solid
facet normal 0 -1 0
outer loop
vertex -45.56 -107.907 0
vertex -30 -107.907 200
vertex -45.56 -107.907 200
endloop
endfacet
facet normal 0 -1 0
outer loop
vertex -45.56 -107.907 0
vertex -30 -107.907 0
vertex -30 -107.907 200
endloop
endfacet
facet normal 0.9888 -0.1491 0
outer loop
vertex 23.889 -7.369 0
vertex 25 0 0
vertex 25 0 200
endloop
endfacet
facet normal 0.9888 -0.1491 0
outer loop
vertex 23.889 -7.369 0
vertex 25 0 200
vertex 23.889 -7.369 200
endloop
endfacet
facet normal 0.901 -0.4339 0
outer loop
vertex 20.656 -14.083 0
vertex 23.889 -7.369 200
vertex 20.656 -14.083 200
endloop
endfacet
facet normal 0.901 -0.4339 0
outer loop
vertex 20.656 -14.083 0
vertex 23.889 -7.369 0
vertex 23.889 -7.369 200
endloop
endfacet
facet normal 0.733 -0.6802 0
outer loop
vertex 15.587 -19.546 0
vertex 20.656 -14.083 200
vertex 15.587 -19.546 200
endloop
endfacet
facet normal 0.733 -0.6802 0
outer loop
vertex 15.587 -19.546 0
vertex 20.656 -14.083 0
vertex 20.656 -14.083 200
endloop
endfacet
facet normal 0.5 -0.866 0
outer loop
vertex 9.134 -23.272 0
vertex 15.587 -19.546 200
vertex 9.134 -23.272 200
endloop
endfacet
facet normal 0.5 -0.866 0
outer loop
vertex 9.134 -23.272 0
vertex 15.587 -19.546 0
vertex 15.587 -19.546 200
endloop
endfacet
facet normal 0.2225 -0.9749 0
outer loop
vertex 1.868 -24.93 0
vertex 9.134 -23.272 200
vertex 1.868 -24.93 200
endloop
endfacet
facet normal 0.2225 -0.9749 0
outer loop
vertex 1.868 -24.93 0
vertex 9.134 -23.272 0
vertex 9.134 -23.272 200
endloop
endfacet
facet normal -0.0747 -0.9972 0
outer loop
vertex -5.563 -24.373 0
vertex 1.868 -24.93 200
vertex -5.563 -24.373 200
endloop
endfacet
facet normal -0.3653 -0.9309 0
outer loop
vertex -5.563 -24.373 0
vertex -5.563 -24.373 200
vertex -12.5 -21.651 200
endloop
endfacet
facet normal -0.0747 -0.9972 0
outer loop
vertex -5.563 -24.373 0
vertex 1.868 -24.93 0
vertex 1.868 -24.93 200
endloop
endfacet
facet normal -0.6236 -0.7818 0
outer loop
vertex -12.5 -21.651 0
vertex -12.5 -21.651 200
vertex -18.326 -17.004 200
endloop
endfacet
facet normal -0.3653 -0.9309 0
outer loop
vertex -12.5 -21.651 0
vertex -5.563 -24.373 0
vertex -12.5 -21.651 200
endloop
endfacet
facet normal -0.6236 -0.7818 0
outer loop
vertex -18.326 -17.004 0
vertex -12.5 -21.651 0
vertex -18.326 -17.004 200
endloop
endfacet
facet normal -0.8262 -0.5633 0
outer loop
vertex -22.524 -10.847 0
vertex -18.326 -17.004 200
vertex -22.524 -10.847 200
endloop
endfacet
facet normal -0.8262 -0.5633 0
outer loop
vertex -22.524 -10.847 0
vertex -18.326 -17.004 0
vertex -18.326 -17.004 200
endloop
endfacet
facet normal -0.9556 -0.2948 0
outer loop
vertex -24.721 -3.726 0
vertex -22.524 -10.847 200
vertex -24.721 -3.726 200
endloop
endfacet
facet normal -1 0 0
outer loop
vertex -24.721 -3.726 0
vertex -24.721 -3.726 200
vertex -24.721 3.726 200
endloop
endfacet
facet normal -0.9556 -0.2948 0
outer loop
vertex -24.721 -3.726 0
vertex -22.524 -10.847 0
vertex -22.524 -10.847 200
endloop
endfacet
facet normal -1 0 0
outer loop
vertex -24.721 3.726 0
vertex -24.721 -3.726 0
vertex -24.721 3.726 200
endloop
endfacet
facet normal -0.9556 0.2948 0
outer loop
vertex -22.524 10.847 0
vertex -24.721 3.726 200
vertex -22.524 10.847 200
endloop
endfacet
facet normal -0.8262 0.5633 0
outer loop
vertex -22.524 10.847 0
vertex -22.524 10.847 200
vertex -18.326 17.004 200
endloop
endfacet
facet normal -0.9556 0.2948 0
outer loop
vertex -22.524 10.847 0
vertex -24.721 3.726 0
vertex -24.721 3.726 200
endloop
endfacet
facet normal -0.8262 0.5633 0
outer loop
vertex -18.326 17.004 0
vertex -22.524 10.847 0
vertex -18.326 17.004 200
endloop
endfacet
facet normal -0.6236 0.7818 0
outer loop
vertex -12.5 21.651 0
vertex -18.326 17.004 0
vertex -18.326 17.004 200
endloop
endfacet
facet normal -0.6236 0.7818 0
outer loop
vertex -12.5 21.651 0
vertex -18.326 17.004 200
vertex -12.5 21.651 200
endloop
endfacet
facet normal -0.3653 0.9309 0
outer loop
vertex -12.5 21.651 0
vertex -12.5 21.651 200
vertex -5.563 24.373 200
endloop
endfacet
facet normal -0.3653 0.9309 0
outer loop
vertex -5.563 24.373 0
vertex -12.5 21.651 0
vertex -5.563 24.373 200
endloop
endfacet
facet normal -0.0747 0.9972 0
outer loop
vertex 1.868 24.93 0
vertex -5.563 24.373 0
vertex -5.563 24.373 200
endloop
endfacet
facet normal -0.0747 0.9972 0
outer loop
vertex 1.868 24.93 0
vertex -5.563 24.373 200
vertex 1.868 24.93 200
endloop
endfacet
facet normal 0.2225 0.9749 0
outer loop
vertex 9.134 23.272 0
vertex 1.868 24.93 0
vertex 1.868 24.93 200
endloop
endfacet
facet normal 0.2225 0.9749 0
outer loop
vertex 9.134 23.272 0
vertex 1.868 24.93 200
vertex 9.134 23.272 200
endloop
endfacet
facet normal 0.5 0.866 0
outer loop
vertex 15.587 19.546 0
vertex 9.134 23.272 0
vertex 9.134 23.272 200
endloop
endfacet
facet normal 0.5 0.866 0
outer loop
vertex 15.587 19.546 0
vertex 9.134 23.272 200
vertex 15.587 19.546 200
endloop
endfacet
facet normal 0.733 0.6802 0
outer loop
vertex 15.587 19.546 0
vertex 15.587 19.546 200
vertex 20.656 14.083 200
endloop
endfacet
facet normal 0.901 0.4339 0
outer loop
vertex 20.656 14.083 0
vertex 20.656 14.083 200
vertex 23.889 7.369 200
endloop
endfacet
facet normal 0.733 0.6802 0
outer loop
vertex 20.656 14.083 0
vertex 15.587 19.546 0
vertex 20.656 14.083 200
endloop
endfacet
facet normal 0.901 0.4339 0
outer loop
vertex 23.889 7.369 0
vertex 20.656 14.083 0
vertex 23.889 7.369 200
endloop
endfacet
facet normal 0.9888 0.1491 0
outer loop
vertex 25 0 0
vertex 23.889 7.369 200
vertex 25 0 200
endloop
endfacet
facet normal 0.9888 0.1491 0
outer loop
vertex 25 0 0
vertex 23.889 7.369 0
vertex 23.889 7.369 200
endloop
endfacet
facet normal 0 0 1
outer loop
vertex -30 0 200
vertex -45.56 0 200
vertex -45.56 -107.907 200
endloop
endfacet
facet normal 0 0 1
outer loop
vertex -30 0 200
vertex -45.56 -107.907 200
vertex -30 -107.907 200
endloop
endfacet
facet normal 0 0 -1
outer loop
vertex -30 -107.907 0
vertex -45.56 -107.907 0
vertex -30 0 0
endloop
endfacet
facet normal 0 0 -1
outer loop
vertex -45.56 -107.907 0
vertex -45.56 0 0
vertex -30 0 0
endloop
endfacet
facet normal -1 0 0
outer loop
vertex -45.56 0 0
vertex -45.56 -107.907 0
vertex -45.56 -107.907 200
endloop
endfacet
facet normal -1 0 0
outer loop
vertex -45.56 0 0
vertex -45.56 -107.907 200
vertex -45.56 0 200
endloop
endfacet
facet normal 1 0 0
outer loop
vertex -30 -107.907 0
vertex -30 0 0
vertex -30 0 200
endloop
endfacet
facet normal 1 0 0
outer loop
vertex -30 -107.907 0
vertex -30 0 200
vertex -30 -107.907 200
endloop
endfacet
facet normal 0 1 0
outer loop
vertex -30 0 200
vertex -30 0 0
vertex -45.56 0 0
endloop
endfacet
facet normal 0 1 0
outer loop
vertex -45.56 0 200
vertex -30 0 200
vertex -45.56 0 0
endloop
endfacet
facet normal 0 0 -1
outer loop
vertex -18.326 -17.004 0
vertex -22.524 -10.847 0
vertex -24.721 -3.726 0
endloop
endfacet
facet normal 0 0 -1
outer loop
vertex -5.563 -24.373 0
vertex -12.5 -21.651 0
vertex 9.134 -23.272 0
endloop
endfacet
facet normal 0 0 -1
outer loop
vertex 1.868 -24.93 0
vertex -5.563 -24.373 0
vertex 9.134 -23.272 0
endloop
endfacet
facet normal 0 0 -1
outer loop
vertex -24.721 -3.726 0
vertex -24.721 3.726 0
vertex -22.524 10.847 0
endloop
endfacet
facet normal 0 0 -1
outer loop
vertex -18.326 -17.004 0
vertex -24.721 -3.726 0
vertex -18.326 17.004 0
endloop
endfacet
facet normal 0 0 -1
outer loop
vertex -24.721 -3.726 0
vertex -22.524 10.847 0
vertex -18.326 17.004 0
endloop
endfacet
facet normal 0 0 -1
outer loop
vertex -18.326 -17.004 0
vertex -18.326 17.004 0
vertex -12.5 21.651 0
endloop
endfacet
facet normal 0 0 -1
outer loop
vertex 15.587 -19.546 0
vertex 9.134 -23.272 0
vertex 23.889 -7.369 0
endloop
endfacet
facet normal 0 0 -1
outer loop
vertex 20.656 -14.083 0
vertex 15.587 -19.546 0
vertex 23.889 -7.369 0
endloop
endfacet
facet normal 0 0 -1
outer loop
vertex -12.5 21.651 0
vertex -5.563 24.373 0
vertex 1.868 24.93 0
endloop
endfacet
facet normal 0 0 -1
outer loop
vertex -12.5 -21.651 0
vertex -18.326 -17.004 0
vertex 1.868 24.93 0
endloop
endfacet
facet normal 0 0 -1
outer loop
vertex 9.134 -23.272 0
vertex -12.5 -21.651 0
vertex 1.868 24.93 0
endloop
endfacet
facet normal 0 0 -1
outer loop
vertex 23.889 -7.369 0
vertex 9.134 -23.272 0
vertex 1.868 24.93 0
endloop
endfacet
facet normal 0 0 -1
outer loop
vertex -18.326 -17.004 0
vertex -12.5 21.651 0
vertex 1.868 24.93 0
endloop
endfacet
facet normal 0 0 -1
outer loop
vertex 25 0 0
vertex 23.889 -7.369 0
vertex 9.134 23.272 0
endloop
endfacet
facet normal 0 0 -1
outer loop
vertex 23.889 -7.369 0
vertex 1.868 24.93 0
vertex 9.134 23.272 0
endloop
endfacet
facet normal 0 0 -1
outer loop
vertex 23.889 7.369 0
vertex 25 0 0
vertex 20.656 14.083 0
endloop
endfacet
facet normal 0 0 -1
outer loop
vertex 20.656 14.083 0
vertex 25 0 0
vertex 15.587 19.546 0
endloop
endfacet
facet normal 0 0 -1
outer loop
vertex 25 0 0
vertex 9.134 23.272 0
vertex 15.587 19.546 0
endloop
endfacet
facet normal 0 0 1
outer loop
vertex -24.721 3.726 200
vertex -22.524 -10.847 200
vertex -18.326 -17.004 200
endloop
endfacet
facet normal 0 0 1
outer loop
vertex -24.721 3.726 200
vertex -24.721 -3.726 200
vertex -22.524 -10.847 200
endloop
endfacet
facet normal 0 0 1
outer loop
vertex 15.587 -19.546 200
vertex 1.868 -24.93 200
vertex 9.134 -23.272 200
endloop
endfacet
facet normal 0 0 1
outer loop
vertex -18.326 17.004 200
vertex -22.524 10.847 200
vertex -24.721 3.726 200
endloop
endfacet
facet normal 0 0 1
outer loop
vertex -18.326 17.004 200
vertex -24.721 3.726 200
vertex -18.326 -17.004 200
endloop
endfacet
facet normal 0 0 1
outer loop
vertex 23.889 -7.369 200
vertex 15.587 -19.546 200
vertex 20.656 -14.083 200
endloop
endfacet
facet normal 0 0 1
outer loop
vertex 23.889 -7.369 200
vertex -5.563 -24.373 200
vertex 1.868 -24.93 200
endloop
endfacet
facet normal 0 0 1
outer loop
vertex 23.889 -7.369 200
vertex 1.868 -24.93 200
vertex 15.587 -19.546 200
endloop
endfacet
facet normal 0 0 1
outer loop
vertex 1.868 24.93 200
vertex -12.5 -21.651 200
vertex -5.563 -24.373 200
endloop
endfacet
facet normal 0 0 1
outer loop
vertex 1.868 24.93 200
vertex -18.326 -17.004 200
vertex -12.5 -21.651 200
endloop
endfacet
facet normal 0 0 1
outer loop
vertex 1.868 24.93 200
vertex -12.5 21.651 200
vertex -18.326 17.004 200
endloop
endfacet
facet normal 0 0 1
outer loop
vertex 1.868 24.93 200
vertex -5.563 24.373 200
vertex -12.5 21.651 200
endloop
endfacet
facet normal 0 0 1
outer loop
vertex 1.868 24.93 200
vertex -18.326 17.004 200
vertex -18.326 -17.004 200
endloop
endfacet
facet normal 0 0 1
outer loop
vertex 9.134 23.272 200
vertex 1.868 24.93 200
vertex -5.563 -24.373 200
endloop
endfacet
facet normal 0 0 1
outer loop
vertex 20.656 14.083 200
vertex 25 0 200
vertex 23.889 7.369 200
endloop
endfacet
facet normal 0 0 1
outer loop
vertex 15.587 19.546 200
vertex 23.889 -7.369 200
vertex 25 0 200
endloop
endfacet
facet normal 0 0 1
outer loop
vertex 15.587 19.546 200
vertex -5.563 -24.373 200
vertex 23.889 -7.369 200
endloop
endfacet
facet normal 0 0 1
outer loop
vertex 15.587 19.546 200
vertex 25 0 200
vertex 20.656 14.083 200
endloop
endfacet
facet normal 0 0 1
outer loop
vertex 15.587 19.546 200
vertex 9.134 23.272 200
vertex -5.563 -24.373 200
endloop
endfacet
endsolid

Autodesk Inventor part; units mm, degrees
ref_plane "YZ Plane" through (0, 0, 0) normal (1, 0, 0) x (0, 1, 0)
ref_plane "XZ Plane" through (0, 0, 0) normal (0, 1, 0) x (-1, 0, 0)
ref_plane "XY Plane" through (0, 0, 0) normal (0, 0, 1) x (1, 0, 0)
sketch "Sketch1" plane through (0, 0, 0) normal (0, 0, 1) x (1, 0, 0)
  circle A0 centre (0, 0) radius 25
  line L0 (0, 0) -> (-45.5599, 0)
  line L1 (-45.5599, 0) -> (-45.5599, -94.5606)
  line L2 (-45.5599, 0) -> (0, 0)
  line L3 (-45.5599, 0) -> (-30, 0)
  line L4 (-30, 0) -> (-30, -107.9074)
  line L5 (-30, -107.9074) -> (-45.5599, -107.9074)
  line L6 (-45.5599, -107.9074) -> (-45.5599, 0)
  line L7 (-30, -107.9074) -> (0, 0)
  dimension "d0" = 50
  dimension "d7" = 112
  dimension "d8" = 30
extrude "Extrusion1" add sketch "Sketch1" along normal blind 200 contours A0 L7 L0 | L0 L7 A0 | L4 L5 L6 L1 L0
properties part number "kes"
